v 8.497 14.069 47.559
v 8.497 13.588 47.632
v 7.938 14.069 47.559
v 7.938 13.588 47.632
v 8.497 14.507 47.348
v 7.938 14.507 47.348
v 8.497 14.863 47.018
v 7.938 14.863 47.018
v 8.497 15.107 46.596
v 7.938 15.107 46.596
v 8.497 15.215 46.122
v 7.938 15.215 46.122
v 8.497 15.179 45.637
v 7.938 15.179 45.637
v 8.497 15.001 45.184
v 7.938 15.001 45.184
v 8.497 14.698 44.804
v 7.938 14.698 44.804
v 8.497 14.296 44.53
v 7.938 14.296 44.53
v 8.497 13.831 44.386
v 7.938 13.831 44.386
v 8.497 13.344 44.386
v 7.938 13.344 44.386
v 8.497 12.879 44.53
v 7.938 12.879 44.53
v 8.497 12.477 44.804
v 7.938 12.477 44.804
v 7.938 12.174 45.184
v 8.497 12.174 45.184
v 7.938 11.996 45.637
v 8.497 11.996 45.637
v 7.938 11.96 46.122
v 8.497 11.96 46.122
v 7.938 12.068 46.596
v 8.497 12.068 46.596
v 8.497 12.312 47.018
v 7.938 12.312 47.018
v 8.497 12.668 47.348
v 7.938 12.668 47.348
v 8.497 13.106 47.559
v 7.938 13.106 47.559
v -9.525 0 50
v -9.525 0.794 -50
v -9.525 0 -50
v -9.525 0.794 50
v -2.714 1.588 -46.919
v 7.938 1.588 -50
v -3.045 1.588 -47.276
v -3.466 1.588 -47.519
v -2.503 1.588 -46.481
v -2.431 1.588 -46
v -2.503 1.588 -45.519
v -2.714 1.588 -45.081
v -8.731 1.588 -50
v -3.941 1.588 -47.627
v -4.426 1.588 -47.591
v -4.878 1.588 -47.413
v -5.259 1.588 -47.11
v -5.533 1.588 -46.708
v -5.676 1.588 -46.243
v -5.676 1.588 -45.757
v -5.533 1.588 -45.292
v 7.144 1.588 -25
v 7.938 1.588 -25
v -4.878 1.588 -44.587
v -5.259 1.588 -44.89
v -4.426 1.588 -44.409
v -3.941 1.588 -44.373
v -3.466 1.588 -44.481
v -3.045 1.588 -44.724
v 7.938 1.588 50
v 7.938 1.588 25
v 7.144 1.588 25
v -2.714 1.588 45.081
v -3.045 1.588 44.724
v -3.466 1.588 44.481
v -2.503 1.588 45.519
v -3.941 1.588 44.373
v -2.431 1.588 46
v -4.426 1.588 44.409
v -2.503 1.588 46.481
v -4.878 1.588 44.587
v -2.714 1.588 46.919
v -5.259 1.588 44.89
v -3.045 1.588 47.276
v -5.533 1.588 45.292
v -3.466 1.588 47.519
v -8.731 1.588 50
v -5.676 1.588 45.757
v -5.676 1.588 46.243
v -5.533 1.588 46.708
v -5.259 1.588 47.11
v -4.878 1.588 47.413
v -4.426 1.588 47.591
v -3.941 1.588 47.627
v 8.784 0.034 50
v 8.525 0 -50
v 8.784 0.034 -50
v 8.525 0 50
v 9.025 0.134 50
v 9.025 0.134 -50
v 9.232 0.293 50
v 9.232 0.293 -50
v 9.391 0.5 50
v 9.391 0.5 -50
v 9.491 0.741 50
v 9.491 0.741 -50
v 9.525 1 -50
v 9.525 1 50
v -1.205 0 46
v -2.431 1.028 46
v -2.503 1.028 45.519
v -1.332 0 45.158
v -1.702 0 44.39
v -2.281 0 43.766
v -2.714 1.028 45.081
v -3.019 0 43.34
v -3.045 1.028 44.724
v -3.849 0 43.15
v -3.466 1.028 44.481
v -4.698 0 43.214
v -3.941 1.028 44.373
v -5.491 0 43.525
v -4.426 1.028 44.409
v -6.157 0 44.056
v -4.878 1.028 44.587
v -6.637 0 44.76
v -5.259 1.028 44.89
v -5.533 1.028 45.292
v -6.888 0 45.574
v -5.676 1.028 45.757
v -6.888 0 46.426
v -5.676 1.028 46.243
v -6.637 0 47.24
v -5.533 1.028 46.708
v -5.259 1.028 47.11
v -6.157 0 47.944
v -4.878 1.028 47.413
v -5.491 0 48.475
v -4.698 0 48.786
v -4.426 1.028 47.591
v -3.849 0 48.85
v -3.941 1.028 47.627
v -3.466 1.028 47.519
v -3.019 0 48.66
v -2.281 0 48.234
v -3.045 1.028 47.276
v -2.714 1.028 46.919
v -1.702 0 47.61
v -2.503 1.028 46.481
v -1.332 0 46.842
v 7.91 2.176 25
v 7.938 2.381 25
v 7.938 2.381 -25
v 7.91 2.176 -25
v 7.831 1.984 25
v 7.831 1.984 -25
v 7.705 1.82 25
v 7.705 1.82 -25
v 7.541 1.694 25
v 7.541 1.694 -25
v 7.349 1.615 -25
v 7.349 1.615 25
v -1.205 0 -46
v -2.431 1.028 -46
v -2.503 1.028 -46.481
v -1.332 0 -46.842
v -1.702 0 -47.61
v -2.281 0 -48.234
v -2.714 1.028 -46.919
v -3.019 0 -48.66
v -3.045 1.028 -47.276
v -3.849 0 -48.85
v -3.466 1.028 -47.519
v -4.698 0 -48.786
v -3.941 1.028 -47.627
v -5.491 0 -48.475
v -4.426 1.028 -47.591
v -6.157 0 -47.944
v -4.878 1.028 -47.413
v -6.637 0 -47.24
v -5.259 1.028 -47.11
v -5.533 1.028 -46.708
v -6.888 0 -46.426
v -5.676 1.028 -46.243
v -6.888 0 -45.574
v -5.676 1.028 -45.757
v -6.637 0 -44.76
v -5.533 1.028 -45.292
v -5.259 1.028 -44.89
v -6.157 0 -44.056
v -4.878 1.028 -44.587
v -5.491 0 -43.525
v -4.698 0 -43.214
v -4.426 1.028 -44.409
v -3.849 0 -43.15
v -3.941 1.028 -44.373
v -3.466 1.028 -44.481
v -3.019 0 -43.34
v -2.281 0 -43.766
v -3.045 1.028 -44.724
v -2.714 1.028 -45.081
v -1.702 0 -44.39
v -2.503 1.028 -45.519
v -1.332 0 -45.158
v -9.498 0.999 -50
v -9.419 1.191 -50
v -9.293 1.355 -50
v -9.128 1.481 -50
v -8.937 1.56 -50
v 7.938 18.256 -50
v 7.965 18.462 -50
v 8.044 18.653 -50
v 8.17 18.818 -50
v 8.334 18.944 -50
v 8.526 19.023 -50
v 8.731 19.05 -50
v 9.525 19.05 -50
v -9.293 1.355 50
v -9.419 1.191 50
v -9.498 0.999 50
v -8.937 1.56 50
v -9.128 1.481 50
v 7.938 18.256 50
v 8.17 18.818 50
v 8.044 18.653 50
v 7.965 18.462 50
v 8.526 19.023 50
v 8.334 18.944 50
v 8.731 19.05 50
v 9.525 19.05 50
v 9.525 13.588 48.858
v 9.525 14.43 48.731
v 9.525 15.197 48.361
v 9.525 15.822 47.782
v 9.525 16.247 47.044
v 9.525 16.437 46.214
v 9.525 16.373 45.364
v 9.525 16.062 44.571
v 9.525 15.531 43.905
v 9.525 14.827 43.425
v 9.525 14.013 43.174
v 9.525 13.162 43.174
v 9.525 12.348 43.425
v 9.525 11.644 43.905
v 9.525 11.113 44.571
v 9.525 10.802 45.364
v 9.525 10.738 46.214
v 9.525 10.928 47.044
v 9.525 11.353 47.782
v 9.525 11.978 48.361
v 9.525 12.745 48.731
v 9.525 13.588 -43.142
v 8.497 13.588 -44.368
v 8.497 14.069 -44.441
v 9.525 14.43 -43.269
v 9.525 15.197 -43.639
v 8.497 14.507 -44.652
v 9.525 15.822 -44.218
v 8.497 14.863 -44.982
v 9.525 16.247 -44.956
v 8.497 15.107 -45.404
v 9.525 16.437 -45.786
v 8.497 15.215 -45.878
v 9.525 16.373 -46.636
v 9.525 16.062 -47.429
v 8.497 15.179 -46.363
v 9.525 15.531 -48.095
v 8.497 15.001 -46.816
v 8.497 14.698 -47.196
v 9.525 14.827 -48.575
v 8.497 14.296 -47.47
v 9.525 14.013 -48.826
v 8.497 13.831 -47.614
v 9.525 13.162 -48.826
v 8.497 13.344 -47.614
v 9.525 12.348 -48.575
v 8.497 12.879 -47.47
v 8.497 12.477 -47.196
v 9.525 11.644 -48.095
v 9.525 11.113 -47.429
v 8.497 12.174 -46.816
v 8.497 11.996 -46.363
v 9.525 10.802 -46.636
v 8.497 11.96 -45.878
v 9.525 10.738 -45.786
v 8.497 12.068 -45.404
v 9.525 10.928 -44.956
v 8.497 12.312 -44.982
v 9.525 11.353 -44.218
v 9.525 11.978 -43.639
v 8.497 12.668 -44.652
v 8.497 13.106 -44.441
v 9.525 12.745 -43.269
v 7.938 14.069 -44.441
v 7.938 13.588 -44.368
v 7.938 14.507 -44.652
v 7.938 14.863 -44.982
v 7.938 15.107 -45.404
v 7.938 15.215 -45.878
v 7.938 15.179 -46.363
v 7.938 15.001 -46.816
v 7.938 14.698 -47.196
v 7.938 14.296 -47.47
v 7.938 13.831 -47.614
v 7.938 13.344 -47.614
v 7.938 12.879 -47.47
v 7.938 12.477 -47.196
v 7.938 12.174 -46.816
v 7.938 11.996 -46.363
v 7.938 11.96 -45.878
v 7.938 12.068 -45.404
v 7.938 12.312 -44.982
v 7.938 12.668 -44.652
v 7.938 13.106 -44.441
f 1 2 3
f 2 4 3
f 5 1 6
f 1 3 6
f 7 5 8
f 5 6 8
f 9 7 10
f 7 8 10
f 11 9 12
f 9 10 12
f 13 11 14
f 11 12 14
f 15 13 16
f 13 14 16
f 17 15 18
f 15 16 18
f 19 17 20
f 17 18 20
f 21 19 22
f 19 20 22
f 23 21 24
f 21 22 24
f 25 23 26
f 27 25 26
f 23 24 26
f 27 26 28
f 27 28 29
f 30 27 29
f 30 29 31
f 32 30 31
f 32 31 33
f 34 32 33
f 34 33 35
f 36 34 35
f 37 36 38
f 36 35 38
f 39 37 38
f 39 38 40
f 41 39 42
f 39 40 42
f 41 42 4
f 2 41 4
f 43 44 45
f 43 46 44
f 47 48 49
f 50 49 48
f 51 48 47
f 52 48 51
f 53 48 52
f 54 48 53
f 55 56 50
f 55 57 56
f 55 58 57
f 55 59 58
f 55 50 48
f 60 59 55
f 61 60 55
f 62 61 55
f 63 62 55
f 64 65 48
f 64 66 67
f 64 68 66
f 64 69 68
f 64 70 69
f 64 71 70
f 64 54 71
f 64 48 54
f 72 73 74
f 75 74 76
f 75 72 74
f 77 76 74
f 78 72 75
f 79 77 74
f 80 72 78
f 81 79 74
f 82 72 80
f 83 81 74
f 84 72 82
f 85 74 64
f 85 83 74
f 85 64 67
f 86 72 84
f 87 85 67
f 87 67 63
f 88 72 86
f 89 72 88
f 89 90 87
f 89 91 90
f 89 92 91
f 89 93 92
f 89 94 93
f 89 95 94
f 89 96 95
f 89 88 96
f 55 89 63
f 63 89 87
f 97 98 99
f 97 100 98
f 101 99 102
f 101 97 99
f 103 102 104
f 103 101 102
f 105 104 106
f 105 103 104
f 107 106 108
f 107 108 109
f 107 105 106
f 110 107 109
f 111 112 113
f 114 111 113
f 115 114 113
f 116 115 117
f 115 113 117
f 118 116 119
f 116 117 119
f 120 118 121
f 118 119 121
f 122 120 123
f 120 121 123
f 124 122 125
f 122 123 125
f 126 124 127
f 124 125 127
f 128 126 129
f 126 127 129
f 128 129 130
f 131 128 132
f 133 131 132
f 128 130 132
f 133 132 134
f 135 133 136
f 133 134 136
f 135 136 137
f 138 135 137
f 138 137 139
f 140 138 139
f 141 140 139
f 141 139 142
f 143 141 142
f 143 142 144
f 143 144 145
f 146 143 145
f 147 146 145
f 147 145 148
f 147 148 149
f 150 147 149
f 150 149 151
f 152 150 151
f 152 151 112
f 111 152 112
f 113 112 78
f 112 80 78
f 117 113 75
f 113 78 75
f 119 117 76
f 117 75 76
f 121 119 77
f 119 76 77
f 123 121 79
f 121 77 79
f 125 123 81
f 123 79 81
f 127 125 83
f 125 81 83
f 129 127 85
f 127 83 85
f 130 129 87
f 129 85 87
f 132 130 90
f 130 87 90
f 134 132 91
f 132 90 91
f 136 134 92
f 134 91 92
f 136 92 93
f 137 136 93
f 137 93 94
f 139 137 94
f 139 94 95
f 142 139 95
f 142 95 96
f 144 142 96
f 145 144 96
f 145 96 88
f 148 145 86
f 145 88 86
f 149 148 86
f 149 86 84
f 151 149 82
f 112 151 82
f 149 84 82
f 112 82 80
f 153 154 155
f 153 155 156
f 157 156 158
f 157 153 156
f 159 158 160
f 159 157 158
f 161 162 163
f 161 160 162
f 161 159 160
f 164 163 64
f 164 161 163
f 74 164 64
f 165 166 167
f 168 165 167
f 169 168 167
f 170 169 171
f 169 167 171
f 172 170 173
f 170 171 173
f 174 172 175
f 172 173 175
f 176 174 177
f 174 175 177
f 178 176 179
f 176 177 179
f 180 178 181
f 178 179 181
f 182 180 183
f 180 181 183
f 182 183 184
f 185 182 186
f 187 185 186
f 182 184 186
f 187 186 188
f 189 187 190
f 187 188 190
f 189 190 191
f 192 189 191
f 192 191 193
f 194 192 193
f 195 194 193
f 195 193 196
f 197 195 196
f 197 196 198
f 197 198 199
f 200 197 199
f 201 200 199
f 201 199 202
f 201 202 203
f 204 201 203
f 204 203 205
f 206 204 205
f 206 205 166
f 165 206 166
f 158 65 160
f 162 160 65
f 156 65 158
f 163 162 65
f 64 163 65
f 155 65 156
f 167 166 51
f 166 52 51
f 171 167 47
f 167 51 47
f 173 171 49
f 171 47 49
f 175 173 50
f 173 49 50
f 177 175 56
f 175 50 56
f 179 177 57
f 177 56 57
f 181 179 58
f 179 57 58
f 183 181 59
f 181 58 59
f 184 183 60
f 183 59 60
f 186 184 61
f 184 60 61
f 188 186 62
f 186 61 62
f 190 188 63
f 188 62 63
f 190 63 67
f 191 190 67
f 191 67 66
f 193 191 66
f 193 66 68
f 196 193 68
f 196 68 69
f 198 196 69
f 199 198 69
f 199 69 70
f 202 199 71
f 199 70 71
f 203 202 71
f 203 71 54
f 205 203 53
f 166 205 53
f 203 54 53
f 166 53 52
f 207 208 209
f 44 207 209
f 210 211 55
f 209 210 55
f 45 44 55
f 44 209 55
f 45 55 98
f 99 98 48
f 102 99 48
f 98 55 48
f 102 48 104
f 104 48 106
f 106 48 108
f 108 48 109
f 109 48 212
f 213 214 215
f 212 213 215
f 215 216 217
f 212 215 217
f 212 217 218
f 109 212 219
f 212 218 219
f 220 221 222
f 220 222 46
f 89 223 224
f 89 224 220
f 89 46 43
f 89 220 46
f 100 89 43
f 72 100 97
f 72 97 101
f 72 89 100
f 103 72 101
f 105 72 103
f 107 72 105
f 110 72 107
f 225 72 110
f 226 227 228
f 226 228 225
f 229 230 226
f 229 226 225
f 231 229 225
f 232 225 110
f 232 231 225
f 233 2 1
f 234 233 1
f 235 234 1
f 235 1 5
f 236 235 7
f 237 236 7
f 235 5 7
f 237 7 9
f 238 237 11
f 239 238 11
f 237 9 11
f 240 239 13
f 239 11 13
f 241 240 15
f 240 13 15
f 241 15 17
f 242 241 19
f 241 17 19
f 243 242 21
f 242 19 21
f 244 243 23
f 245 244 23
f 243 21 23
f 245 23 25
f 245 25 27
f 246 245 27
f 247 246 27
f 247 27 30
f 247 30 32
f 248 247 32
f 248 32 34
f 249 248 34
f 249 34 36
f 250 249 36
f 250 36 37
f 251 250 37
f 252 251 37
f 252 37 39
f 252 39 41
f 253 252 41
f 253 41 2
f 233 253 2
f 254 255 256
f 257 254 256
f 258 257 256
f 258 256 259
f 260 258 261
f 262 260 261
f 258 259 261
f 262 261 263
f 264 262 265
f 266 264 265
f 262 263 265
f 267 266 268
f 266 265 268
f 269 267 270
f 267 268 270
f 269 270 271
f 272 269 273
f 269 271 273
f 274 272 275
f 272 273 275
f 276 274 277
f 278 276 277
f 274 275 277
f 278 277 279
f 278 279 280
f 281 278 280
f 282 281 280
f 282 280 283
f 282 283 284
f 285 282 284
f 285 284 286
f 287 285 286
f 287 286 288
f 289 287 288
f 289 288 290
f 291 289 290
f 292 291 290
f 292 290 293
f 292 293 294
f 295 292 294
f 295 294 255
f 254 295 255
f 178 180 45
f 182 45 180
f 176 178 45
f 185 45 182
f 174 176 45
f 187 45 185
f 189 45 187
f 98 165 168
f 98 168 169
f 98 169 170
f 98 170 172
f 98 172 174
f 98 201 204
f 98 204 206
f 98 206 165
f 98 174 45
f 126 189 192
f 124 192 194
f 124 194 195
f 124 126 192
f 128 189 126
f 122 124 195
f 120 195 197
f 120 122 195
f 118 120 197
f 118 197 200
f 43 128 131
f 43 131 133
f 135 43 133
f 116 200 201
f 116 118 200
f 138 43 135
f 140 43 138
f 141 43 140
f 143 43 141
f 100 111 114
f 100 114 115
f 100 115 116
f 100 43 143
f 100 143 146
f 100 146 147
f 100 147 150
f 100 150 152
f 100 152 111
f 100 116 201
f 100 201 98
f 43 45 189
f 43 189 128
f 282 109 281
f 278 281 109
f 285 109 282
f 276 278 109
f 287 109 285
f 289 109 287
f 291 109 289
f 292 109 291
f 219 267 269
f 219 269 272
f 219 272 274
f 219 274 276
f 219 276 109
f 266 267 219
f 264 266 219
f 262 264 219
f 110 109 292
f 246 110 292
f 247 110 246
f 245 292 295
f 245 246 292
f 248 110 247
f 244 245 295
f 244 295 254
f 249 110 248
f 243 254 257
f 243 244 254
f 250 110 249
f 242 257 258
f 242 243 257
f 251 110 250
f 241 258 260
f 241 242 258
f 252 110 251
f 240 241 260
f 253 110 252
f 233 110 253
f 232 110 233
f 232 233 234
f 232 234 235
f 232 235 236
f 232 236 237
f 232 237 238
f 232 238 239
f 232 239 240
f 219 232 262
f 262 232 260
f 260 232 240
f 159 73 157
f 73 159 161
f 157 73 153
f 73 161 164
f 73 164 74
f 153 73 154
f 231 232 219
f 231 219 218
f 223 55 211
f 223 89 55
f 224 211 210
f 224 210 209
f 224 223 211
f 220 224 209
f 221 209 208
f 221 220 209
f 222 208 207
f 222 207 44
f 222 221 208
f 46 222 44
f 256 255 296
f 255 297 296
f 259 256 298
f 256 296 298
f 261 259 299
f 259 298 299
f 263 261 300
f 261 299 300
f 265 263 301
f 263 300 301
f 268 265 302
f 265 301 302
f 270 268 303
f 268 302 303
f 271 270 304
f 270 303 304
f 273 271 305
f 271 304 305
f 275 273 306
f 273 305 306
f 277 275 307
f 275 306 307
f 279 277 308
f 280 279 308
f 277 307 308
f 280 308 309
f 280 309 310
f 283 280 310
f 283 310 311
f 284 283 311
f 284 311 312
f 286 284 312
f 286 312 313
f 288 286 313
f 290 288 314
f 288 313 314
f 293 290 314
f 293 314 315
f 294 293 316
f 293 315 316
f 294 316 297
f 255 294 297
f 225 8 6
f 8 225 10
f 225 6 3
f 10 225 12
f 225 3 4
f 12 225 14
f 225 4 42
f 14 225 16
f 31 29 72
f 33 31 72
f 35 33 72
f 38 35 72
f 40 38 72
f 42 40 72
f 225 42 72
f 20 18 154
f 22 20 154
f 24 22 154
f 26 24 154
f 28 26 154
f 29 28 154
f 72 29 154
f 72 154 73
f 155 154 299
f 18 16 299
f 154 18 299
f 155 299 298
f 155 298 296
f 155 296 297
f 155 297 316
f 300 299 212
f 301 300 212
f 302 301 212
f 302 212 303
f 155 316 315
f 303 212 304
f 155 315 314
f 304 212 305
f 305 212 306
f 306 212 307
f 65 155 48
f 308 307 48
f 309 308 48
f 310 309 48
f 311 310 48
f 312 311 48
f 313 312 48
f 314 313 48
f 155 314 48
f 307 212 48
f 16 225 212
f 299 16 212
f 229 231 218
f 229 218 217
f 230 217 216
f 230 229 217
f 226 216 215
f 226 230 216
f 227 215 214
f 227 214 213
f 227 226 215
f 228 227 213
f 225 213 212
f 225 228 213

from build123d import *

# Parameters (mm, degrees)
BOSS_EXTRUDE1_DEPTH                               = 50
CSK_FOR_4_FLAT_HEAD_MACHINE_SCREW_100_D           = 3.2639
CSK_FOR_4_FLAT_HEAD_MACHINE_SCREW_100_CSINK_D     = 5.715
CSK_FOR_4_FLAT_HEAD_MACHINE_SCREW_100_CSINK_ANGLE = 100
CSK_FOR_4_FLAT_HEAD_MACHINE_SCREW_2_D             = 3.2639
CSK_FOR_4_FLAT_HEAD_MACHINE_SCREW_2_CSINK_D       = 5.715
CSK_FOR_4_FLAT_HEAD_MACHINE_SCREW_2_CSINK_ANGLE   = 100
FILLET1_R                                         = 1
CUT_EXTRUDE1_DEPTH                                = 25


with BuildPart() as part:
    # Sketch2 → Boss-Extrude1 (new, symmetric)
    with BuildSketch(Plane.XY):
        with BuildLine():
            Line((-9.525, 0), (9.525, 0))
            Line((9.525, 0), (9.525, 19.05))
            Line((9.525, 19.05), (8.73125, 19.05))
            ThreePointArc((8.73125, 19.05), (8.169983992, 18.817516008), (7.9375, 18.25625))
            Line((7.9375, 18.25625), (7.9375, 2.38125))
            ThreePointArc((7.9375, 2.38125), (7.705016008, 1.819983992), (7.14375, 1.5875))
            Line((7.14375, 1.5875), (-8.73125, 1.5875))
            ThreePointArc((-8.73125, 1.5875), (-9.292516008, 1.355016008), (-9.525, 0.79375))
            Line((-9.525, 0.79375), (-9.525, 0))
        make_face()
    extrude(amount=BOSS_EXTRUDE1_DEPTH, both=True)

    # CSK for _4 Flat Head Machine Screw _100 (through all)
    with Locations(Plane(origin=(0, 0, 0), x_dir=(-1, 0, 0), z_dir=(0, -1, 0))):
        with Locations((4.0625, -46), (4.0625, 46)):
            CounterSinkHole(CSK_FOR_4_FLAT_HEAD_MACHINE_SCREW_100_D / 2, CSK_FOR_4_FLAT_HEAD_MACHINE_SCREW_100_CSINK_D / 2, counter_sink_angle=CSK_FOR_4_FLAT_HEAD_MACHINE_SCREW_100_CSINK_ANGLE)

    # CSK for _4 Flat Head Machine Screw _ 2 (through all)
    with Locations(Plane(origin=(9.525, 0, 0), x_dir=(0, 0, -1), z_dir=(1, 0, 0))):
        with Locations((-46, 13.5875), (46, 13.5875)):
            CounterSinkHole(CSK_FOR_4_FLAT_HEAD_MACHINE_SCREW_2_D / 2, CSK_FOR_4_FLAT_HEAD_MACHINE_SCREW_2_CSINK_D / 2, counter_sink_angle=CSK_FOR_4_FLAT_HEAD_MACHINE_SCREW_2_CSINK_ANGLE)

    # Fillet1
    fillet1_edges = [part.edges().sort_by_distance(p)[0] for p in [
        (9.525, 0, 0),
    ]]
    fillet(fillet1_edges, radius=FILLET1_R)

    # Sketch24 → Cut-Extrude1 (cut)
    with BuildSketch(Plane.XY.offset(50)):
        Polygon((2.9375, 1.5875), (7.9375, 6.5875), (7.9375, 1.5875), align=None)
    cut_extrude1 = extrude(amount=-CUT_EXTRUDE1_DEPTH, mode=Mode.SUBTRACT)

    # Mirror1: Cut-Extrude1 across plane
    add(cut_extrude1.mirror(Plane.XY), mode=Mode.SUBTRACT)


solid = part.part
